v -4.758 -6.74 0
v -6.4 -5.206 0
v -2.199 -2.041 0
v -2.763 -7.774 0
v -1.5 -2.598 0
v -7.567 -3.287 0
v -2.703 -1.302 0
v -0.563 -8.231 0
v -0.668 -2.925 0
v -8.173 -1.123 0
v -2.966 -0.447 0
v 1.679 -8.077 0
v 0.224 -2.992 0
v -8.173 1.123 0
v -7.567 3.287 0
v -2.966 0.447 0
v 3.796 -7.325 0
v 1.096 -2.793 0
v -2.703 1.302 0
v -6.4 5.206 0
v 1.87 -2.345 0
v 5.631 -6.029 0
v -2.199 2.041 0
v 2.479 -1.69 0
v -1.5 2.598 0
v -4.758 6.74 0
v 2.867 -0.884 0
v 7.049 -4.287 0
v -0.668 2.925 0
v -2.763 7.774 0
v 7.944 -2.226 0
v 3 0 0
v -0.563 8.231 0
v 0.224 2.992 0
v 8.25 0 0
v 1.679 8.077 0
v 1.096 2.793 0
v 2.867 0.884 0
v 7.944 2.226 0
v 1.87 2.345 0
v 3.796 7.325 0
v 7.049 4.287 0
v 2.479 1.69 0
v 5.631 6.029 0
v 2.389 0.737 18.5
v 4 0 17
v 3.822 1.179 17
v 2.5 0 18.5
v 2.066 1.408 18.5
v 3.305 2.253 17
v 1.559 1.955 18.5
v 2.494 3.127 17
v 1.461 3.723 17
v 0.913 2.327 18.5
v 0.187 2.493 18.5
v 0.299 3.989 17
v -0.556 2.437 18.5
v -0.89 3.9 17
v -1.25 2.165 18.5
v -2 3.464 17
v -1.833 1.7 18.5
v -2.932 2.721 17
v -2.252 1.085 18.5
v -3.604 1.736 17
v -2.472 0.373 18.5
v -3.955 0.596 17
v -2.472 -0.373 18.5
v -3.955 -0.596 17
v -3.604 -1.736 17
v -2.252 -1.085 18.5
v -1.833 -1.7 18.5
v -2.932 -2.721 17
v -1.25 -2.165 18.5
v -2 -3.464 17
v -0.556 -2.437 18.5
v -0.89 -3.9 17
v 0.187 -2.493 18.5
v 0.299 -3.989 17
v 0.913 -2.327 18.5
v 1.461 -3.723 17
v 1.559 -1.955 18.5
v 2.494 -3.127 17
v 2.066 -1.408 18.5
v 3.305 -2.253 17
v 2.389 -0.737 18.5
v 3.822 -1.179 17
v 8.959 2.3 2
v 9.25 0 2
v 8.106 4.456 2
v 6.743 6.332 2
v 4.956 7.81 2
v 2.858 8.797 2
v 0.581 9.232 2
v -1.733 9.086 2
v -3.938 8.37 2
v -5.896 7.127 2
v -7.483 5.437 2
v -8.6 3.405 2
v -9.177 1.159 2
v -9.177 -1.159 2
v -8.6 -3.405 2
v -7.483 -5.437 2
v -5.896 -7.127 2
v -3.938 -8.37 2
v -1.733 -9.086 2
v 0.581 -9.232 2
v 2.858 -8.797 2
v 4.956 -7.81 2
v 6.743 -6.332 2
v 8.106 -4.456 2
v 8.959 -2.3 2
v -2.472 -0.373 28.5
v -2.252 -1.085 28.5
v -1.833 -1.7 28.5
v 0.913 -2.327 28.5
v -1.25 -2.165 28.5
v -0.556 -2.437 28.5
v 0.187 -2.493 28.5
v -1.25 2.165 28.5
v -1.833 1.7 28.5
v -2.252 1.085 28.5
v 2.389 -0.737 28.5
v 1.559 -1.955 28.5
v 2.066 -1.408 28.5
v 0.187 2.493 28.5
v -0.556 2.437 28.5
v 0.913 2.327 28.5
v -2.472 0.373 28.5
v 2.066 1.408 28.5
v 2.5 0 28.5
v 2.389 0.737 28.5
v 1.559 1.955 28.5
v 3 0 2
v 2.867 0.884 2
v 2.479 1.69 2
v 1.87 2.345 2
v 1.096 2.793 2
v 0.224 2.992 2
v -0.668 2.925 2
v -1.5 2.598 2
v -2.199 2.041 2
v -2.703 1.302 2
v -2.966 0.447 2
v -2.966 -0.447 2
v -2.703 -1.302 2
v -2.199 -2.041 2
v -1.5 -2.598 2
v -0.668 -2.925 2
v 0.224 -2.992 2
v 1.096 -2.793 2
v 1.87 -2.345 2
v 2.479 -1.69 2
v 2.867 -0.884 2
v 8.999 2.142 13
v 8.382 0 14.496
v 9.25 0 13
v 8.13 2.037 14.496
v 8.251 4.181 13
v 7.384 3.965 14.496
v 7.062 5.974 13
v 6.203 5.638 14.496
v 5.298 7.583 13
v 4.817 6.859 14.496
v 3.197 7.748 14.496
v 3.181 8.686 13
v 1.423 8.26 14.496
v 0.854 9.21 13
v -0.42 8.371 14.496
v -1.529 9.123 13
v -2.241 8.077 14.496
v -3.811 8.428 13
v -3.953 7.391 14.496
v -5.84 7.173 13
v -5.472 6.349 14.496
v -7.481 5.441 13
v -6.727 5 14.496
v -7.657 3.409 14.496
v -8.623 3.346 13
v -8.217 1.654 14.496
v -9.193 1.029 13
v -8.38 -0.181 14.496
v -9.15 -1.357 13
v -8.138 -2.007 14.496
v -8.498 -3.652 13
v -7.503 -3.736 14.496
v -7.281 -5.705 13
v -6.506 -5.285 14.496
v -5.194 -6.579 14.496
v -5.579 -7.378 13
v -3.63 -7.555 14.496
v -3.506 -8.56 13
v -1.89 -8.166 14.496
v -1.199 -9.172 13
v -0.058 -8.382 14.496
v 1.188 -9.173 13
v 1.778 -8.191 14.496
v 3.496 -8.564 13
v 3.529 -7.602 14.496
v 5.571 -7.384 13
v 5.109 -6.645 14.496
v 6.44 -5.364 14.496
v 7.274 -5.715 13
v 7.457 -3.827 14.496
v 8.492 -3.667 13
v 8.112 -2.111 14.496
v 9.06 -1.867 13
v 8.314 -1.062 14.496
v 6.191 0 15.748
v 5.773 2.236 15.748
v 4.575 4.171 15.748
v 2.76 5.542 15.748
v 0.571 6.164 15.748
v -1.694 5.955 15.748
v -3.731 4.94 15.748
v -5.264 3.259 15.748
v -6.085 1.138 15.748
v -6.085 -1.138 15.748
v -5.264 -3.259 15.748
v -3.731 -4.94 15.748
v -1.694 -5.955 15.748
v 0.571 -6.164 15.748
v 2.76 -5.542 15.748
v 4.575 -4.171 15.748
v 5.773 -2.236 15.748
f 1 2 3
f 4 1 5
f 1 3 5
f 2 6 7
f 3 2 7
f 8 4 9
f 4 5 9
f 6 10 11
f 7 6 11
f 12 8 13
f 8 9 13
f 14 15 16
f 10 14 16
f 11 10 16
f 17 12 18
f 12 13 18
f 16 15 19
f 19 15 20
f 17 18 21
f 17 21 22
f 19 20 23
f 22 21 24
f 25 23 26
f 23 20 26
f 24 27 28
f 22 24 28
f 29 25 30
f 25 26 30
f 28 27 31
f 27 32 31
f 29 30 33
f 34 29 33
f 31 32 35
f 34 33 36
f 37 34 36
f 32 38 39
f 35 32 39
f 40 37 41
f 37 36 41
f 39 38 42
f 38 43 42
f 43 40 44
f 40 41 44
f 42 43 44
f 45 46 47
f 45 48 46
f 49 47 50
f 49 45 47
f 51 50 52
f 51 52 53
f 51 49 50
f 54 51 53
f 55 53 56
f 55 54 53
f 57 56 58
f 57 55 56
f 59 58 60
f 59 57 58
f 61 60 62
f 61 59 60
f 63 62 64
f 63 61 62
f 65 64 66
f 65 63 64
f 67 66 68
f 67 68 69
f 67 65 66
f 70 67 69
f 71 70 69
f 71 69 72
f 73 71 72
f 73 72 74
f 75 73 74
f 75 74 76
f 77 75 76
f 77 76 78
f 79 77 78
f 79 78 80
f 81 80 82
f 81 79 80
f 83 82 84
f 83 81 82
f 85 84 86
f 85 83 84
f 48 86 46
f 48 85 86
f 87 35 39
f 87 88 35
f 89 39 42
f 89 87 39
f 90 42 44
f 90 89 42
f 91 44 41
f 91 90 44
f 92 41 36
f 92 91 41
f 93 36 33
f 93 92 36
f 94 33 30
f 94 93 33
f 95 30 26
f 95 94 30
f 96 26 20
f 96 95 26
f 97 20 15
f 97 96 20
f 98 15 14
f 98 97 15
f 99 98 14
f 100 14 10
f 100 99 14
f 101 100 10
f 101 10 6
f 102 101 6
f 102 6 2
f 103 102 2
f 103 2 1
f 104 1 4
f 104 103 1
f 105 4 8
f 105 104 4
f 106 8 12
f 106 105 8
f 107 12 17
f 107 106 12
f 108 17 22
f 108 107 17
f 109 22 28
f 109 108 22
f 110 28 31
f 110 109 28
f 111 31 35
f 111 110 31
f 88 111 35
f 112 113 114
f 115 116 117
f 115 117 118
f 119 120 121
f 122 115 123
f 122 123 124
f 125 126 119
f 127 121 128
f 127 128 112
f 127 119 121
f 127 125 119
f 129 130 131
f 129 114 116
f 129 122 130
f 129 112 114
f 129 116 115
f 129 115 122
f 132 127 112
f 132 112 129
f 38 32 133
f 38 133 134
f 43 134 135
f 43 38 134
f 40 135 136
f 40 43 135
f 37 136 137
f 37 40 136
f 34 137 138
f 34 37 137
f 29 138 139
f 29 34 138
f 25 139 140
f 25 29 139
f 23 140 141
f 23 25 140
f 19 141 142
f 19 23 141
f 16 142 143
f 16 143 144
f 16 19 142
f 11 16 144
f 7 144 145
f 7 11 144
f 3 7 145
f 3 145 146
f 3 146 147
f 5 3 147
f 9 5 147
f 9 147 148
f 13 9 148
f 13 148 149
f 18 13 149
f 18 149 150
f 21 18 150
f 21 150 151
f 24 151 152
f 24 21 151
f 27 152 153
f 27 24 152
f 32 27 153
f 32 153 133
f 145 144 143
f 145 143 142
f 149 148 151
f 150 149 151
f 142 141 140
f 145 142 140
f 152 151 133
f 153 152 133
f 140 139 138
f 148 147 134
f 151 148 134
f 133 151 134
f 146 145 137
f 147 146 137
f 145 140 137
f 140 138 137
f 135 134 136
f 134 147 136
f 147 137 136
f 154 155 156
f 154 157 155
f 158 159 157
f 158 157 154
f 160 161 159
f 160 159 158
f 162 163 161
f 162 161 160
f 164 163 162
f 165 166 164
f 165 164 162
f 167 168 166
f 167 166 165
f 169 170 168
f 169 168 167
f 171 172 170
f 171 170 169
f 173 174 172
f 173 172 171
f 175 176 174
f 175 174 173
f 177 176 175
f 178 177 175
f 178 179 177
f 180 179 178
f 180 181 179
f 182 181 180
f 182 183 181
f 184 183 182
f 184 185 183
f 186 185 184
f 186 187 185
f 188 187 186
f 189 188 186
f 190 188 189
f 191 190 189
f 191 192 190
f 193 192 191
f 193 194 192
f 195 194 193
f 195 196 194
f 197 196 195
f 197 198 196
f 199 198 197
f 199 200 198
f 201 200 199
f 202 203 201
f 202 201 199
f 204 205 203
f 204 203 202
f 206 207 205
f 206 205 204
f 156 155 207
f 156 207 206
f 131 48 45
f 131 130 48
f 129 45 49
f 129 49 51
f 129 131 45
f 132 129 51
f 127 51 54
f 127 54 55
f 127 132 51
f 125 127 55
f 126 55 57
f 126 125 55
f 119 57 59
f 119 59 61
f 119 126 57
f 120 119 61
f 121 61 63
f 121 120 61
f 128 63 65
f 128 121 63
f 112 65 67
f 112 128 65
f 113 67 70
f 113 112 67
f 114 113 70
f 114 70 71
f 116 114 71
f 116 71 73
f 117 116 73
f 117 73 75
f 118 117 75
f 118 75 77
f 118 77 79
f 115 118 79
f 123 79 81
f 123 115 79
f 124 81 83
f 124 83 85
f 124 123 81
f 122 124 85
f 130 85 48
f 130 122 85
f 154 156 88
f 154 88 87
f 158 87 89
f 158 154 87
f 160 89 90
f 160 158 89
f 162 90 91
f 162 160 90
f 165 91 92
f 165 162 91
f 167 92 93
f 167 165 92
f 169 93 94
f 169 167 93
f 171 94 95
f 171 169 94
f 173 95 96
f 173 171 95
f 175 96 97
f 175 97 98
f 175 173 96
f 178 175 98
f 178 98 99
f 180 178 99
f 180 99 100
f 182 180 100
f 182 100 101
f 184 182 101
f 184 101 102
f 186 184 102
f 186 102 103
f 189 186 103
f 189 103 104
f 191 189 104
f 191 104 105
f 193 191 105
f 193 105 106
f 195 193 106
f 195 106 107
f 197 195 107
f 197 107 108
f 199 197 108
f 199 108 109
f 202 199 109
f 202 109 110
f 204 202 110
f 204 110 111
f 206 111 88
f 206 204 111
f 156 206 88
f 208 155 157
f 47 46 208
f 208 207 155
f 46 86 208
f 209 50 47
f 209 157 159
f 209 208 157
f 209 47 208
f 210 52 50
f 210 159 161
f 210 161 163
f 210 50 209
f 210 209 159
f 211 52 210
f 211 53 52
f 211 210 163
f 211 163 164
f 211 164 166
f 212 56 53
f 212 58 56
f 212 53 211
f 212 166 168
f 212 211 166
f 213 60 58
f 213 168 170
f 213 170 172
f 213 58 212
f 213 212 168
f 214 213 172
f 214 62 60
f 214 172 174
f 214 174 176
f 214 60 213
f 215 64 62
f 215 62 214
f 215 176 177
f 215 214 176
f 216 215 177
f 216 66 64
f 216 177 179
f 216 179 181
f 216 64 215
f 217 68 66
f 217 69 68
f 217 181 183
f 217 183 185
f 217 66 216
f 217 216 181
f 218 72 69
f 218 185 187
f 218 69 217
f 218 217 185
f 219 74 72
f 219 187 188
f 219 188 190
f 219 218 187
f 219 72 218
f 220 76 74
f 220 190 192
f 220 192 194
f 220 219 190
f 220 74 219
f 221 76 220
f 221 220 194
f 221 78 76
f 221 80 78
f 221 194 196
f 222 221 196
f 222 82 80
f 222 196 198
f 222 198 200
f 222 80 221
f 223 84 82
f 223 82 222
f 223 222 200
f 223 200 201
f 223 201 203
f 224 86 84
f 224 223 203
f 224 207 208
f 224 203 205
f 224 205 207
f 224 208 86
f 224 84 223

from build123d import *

# Parameters (mm, degrees)
F5_R       = 8.25
F6_R       = 9.25
F11_FACE_R = 9.25
F7_R       = 9.25
F12_FACE_R = 9.25
F9_R       = 4
F13_FACE_R = 4
F8_R       = 2.5
F14_FACE_R = 2.5
F10_R      = 2.5
F16_SIZE   = 1
F17_R      = 3
F18_DEPTH  = 2


with BuildPart() as f11:
    # F5 (on Top) → F11 section 0
    with BuildSketch(Plane.XY):
        Circle(F5_R)
    # F6 (on offset) → F11 section 1
    with BuildSketch(Plane.XY.offset(2)):
        Circle(F6_R)
    loft()

    # F11_face (on face) → F12 section 0
    with BuildSketch(Plane.XY.offset(2)):
        Circle(F11_FACE_R)
    # F7 (on offset) → F12 section 1
    with BuildSketch(Plane.XY.offset(14)):
        Circle(F7_R)
    loft()

    # F12_face (on face) → F13 section 0
    with BuildSketch(Plane.XY.offset(14)):
        Circle(F12_FACE_R)
    # F9 (on offset) → F13 section 1
    with BuildSketch(Plane.XY.offset(17)):
        Circle(F9_R)
    loft()

    # F13_face (on face) → F14 section 0
    with BuildSketch(Plane.XY.offset(17)):
        Circle(F13_FACE_R)
    # F8 (on offset) → F14 section 1
    with BuildSketch(Plane.XY.offset(18.5)):
        Circle(F8_R)
    loft()

    # F14_face (on face) → F15 section 0
    with BuildSketch(Plane.XY.offset(18.5)):
        Circle(F14_FACE_R)
    # F10 (on offset) → F15 section 1
    with BuildSketch(Plane.XY.offset(28.5)):
        Circle(F10_R)
    loft()

    # F16
    f16_edges = [f11.edges().sort_by_distance(p)[0] for p in [
        (-9.25, 0, 14),
    ]]
    chamfer(f16_edges, length=F16_SIZE)

    # F17 (on Top) → F18 (cut)
    with BuildSketch(Plane.XY):
        Circle(F17_R)
    extrude(amount=F18_DEPTH, mode=Mode.SUBTRACT)


solid = f11.part
